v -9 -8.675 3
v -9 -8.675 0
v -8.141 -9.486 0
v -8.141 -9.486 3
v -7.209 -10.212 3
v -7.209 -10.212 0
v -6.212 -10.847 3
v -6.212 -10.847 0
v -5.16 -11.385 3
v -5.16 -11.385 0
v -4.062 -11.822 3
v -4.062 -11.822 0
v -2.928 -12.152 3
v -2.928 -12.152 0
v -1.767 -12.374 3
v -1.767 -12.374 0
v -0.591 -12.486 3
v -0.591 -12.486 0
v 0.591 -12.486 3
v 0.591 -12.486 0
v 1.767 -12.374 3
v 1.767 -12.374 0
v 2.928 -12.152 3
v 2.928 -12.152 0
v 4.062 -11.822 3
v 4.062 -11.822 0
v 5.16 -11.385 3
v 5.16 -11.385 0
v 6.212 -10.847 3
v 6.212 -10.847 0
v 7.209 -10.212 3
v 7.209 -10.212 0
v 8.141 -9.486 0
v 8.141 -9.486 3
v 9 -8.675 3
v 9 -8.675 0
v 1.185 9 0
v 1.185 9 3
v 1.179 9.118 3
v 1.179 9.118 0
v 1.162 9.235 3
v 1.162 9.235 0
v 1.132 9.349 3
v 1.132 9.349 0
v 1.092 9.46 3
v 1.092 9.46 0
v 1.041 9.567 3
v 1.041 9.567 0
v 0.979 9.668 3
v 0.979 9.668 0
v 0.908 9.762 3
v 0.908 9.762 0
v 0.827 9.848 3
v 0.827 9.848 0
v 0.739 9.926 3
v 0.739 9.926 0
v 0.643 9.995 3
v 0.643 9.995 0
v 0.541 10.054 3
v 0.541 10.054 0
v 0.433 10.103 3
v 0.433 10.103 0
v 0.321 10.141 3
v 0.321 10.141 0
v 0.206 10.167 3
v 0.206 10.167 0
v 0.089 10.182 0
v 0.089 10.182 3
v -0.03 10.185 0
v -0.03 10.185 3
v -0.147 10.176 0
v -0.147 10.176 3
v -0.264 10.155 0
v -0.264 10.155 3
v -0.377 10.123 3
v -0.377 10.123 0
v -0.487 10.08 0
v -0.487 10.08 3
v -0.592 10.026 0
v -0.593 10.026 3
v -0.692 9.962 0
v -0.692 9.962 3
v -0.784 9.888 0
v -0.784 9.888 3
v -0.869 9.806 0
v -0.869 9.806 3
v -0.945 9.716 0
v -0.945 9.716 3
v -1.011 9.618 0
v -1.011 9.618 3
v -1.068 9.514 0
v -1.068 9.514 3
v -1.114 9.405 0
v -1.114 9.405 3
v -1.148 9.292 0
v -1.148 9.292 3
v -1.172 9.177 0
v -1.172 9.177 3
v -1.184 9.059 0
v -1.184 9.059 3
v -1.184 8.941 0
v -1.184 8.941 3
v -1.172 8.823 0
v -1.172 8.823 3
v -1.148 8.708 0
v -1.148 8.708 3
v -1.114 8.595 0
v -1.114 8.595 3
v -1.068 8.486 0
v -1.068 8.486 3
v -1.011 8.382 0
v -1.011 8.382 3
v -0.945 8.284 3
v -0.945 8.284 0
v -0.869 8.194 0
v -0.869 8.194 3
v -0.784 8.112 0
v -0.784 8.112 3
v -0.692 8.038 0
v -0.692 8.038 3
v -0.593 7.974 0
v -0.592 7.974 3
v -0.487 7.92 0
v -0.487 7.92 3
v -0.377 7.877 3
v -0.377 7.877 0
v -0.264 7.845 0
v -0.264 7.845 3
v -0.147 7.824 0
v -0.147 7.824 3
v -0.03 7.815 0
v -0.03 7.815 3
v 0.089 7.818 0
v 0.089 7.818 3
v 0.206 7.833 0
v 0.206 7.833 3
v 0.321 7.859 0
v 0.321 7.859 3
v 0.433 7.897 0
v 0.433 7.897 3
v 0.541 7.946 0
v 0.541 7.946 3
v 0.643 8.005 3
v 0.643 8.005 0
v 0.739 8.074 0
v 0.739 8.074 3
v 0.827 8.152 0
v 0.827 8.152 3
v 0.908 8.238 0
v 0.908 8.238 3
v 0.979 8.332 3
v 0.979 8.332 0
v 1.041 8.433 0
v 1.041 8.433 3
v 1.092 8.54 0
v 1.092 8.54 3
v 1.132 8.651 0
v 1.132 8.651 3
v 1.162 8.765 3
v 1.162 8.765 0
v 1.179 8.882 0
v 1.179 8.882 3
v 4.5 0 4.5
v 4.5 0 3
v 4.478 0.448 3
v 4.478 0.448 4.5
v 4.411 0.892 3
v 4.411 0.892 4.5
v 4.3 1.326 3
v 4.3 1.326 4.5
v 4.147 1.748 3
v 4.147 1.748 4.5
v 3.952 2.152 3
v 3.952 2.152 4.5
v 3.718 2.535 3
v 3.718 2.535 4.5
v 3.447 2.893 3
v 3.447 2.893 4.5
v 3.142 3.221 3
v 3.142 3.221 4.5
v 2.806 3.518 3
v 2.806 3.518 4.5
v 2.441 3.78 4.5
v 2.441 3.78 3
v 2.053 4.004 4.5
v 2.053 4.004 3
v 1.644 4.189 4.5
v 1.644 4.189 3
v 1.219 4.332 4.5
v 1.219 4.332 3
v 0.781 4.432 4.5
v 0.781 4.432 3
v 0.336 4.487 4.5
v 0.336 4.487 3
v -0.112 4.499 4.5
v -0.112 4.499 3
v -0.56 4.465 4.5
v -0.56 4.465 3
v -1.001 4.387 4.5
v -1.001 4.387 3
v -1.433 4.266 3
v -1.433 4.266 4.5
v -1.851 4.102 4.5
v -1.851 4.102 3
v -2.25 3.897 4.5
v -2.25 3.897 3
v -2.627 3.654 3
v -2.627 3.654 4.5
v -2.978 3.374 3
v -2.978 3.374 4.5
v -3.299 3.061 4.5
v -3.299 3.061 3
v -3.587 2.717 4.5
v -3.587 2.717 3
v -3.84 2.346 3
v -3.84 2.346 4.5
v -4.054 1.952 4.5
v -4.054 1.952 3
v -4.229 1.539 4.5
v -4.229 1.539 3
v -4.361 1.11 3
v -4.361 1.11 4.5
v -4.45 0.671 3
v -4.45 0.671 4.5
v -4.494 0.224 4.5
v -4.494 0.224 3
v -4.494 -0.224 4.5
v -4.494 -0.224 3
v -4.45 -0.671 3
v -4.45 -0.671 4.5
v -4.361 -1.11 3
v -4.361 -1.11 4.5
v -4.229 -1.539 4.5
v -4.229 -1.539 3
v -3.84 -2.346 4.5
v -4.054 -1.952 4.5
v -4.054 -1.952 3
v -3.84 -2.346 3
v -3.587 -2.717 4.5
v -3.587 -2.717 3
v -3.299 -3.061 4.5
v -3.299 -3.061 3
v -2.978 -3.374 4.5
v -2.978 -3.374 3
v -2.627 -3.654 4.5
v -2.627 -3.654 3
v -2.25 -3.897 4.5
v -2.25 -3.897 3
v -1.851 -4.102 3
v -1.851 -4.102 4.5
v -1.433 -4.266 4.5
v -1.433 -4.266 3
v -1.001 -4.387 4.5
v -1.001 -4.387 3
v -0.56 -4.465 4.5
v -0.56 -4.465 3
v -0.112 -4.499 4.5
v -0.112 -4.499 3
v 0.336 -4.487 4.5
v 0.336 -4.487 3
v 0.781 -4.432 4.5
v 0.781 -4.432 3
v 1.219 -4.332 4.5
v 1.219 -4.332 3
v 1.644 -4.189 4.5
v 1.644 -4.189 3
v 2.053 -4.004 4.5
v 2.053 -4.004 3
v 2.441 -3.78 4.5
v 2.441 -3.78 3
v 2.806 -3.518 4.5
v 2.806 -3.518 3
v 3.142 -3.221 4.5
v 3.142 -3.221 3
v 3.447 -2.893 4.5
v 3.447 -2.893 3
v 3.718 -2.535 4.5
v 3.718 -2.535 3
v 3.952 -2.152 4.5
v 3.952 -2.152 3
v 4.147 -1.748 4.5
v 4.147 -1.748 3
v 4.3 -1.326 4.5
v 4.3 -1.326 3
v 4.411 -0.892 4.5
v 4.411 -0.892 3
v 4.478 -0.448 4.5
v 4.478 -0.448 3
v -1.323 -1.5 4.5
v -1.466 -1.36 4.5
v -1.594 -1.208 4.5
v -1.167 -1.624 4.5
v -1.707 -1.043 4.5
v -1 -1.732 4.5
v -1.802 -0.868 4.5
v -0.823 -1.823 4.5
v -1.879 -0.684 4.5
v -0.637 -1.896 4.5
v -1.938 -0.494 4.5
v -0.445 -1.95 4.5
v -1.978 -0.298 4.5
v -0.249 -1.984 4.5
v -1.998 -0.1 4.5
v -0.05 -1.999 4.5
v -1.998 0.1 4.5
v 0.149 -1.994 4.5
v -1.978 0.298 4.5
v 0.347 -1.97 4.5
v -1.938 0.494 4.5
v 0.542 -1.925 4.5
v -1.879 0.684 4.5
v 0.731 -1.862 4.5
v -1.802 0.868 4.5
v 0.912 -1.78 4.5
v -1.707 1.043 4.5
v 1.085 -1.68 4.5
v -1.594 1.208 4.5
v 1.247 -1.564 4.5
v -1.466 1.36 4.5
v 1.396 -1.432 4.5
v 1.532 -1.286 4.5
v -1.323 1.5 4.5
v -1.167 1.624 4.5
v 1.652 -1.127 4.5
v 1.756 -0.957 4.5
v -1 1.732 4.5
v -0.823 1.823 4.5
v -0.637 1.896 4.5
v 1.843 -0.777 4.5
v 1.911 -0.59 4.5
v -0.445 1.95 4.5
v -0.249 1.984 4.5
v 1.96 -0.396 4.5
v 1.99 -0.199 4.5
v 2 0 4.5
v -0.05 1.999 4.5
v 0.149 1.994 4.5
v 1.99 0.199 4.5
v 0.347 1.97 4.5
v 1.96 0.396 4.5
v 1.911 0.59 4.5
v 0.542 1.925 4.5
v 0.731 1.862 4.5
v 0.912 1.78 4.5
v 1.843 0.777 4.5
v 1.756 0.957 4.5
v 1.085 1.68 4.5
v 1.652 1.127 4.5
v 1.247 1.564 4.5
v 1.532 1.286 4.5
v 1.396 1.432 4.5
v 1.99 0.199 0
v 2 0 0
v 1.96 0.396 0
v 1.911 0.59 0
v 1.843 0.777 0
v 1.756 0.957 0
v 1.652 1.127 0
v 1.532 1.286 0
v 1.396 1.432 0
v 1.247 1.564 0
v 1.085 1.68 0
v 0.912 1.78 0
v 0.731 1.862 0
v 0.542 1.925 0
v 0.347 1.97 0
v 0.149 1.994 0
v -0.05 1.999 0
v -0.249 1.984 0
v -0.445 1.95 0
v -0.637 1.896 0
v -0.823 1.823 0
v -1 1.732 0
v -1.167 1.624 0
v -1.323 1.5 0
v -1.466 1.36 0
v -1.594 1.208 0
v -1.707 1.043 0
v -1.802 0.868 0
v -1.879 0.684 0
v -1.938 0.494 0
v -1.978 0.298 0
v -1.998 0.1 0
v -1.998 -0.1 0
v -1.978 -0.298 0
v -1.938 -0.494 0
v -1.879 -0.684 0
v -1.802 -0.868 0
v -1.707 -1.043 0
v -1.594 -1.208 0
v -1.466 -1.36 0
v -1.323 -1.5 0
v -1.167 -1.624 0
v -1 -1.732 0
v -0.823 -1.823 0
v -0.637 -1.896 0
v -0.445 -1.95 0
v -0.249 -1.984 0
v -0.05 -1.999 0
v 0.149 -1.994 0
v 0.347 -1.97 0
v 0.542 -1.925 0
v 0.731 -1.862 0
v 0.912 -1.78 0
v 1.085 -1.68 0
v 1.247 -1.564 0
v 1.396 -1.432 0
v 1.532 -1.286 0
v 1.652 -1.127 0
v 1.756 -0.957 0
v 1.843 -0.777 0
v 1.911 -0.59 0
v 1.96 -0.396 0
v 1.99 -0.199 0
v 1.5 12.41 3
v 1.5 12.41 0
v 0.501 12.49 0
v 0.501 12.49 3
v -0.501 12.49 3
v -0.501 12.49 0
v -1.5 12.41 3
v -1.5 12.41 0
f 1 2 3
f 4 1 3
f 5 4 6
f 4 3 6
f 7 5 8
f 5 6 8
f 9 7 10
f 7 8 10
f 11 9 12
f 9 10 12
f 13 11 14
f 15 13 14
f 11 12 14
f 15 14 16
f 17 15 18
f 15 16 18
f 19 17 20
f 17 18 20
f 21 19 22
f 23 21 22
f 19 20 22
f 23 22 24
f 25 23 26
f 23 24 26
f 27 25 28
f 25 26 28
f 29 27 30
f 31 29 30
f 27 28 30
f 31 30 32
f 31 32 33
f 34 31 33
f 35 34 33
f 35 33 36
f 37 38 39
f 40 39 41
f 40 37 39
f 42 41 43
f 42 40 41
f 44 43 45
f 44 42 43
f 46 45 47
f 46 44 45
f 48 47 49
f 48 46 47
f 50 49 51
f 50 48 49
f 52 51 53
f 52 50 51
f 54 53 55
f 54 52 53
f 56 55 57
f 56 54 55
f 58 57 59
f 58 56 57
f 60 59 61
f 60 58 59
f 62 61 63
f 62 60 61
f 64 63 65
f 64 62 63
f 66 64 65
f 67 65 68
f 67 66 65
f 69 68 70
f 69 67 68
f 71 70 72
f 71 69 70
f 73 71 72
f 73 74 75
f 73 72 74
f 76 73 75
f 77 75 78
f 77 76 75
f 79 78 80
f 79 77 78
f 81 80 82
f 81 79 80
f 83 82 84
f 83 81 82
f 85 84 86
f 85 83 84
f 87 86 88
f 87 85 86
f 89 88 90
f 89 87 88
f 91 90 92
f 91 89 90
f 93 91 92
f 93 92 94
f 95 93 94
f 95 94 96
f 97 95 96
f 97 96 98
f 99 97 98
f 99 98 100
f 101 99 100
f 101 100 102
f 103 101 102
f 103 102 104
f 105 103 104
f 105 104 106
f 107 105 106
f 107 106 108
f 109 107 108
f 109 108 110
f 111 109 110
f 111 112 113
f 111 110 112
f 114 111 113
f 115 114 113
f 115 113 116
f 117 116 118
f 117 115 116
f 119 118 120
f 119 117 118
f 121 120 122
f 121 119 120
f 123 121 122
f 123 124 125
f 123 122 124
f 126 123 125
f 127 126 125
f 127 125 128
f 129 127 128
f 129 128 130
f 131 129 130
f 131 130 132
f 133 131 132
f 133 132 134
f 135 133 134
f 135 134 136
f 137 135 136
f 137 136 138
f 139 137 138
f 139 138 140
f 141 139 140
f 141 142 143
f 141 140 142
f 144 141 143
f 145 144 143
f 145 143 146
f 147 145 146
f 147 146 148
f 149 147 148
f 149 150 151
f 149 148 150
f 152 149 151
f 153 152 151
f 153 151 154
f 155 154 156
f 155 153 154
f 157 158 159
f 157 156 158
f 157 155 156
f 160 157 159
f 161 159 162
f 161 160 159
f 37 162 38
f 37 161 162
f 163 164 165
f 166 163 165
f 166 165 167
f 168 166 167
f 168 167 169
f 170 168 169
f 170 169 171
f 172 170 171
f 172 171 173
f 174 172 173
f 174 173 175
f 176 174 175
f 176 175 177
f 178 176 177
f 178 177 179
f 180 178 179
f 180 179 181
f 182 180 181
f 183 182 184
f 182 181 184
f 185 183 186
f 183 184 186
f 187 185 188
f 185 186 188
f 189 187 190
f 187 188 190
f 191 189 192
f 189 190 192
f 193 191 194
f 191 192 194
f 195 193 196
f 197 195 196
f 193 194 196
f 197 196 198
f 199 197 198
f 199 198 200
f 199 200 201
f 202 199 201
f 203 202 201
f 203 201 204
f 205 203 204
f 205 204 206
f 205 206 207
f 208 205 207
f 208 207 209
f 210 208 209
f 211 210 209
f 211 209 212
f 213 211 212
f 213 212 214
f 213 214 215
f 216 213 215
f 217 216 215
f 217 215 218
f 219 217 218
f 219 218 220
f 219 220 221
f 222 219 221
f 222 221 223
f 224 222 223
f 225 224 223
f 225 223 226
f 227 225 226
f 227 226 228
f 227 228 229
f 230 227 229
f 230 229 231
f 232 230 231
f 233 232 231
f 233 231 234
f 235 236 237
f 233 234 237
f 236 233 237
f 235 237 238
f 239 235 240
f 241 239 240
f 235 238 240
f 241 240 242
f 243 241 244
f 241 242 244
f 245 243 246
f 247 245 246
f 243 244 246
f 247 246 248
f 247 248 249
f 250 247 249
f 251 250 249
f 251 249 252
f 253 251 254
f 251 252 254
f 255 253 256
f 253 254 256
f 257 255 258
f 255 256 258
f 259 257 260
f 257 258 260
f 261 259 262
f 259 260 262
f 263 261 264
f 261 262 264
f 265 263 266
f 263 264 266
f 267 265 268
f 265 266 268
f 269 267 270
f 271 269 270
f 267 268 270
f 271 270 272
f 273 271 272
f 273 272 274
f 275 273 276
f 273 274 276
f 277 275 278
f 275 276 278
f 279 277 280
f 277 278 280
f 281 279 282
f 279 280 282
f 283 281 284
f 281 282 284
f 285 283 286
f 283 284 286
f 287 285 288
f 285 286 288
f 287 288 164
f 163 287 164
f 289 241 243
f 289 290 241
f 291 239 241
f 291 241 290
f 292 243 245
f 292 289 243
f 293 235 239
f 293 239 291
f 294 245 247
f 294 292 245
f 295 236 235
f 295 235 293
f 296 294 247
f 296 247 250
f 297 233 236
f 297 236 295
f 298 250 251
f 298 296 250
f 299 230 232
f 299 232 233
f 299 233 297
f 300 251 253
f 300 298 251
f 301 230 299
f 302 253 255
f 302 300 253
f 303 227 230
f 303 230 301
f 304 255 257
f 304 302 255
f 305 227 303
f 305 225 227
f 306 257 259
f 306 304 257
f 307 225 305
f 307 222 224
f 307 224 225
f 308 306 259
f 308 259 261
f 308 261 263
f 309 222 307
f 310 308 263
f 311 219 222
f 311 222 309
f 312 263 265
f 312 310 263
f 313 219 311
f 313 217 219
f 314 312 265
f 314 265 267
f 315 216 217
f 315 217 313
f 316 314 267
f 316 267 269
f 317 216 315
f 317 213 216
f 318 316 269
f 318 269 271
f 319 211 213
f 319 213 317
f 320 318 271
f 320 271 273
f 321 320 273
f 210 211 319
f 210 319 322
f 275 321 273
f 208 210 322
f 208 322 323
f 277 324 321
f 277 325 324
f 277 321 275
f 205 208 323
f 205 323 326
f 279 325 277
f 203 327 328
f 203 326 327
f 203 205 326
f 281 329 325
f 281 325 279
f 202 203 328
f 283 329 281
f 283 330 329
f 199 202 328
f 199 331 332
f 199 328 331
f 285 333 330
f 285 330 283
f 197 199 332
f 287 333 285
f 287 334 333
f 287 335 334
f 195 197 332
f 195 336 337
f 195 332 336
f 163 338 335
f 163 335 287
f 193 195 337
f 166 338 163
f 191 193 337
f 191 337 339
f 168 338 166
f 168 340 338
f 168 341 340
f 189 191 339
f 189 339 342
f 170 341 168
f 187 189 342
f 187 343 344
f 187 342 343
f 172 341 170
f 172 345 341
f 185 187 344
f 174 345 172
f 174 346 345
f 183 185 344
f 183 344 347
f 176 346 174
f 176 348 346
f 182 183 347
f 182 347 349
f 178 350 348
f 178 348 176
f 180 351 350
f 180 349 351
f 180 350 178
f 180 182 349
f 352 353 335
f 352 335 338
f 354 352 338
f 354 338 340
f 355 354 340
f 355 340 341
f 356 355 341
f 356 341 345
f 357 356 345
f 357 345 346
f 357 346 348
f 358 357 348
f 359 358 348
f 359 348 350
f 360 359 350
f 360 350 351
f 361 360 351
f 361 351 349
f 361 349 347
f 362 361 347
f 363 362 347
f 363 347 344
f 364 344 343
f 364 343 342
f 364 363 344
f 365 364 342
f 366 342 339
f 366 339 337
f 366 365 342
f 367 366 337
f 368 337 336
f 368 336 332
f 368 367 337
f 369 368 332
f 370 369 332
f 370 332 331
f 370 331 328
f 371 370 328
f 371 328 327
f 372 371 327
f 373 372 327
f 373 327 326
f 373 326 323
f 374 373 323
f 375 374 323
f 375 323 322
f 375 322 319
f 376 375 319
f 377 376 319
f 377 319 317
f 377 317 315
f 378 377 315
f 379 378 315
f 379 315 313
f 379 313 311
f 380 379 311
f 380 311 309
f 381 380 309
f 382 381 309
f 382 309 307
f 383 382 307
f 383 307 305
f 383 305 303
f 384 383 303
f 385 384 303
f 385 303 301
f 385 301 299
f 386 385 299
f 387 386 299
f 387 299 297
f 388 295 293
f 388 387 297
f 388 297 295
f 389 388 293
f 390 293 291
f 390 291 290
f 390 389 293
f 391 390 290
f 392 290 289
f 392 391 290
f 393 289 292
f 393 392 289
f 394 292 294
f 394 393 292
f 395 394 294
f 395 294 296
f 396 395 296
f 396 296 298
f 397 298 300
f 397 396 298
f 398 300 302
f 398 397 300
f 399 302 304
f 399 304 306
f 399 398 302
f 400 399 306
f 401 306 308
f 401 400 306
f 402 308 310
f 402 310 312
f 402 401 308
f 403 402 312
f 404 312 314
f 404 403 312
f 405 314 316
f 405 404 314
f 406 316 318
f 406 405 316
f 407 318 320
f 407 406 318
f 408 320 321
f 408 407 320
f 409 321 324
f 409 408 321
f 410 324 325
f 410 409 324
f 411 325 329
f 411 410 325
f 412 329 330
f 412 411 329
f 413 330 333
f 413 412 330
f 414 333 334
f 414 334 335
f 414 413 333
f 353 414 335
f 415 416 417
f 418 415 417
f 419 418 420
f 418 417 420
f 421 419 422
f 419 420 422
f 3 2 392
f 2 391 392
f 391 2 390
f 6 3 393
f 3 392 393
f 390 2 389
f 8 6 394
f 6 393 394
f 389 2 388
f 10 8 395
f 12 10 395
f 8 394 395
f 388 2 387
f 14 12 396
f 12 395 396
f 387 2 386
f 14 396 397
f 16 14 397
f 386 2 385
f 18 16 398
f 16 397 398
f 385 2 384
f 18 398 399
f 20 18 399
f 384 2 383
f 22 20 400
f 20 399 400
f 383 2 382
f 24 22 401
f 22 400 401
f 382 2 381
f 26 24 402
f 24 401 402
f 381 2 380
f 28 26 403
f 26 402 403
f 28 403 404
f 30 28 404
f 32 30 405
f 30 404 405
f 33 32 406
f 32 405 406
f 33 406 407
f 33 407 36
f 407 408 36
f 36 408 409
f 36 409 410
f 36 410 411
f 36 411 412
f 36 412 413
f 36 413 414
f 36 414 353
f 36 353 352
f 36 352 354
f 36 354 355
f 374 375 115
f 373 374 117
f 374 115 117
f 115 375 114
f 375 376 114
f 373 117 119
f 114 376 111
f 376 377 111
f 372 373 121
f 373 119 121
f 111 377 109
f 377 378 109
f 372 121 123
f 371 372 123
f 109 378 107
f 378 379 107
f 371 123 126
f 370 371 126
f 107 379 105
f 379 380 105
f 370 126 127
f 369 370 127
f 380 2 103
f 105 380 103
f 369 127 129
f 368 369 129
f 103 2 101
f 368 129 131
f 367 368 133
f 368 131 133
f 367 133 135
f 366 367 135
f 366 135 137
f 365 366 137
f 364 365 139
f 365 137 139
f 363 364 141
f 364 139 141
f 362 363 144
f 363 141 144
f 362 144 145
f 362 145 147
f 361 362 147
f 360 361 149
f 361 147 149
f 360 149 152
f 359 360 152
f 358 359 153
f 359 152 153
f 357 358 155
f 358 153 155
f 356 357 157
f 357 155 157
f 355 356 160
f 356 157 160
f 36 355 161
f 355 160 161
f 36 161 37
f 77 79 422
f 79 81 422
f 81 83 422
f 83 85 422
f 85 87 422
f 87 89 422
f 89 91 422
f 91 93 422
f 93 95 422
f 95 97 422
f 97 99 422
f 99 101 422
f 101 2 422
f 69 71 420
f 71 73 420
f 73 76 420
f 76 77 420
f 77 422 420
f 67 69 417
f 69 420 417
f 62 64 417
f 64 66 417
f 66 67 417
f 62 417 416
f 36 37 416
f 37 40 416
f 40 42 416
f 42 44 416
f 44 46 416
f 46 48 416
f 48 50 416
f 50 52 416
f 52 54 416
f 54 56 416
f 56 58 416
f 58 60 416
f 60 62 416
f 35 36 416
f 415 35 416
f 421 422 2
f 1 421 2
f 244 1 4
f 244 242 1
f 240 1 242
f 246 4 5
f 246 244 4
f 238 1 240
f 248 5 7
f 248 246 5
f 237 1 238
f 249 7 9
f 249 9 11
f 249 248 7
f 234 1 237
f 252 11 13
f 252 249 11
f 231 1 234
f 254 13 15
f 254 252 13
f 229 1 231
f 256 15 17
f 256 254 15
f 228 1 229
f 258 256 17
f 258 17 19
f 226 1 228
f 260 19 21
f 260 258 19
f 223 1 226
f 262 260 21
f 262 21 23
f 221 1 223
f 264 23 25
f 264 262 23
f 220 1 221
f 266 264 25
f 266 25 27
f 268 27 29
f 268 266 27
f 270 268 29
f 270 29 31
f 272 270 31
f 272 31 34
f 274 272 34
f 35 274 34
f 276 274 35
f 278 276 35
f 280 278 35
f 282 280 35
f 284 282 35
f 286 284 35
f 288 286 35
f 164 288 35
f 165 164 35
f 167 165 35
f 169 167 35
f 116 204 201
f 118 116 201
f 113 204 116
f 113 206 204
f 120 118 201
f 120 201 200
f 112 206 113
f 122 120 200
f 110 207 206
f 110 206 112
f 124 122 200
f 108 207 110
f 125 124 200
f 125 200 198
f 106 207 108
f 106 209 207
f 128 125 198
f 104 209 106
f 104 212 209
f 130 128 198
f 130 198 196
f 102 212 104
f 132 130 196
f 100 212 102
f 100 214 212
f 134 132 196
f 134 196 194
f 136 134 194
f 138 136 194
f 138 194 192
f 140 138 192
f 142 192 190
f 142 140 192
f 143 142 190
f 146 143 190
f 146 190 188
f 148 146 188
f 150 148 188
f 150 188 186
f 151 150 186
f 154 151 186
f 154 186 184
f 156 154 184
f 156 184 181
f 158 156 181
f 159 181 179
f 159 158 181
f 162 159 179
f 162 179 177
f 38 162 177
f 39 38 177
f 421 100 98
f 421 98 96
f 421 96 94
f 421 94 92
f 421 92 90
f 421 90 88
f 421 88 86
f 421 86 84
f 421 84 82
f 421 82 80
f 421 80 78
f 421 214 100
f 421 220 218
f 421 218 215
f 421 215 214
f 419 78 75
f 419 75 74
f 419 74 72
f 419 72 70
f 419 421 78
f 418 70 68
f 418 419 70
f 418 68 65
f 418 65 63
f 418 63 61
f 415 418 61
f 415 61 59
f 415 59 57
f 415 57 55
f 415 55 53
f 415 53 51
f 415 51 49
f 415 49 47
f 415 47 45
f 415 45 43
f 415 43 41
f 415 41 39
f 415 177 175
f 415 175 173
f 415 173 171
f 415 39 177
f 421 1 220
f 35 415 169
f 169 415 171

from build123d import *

# Parameters (mm, degrees)
F0_R     = 4.5
F0_R_2   = 2
F2_DEPTH = 3
F1_R     = 1.185
F3_DEPTH = 25
F4_DEPTH = 4.5


with BuildPart() as f2:
    # F0 (on Top) → F2 (new body)
    with BuildSketch(Plane.XY):
        with BuildLine():
            Line((-1.5, 12.409674), (-9, -8.674676))
            ThreePointArc((-9, -8.674676), (0, -12.5), (9, -8.674676))
            Line((9, -8.674676), (1.5, 12.409674))
            ThreePointArc((1.5, 12.409674), (0, 12.5), (-1.5, 12.409674))
        make_face()
        Circle(F0_R, mode=Mode.SUBTRACT)
        Circle(F0_R)
        Circle(F0_R_2, mode=Mode.SUBTRACT)
    extrude(amount=F2_DEPTH)

    # F1 (on Top) → F3 (cut)
    with BuildSketch(Plane.XY):
        with Locations((0, 9)):
            Circle(F1_R)
    extrude(amount=F3_DEPTH, mode=Mode.SUBTRACT)

    # F0 (on Top) → F4 (join)
    with BuildSketch(Plane.XY):
        Circle(F0_R)
        Circle(F0_R_2, mode=Mode.SUBTRACT)
    extrude(amount=F4_DEPTH)


solid = f2.part
